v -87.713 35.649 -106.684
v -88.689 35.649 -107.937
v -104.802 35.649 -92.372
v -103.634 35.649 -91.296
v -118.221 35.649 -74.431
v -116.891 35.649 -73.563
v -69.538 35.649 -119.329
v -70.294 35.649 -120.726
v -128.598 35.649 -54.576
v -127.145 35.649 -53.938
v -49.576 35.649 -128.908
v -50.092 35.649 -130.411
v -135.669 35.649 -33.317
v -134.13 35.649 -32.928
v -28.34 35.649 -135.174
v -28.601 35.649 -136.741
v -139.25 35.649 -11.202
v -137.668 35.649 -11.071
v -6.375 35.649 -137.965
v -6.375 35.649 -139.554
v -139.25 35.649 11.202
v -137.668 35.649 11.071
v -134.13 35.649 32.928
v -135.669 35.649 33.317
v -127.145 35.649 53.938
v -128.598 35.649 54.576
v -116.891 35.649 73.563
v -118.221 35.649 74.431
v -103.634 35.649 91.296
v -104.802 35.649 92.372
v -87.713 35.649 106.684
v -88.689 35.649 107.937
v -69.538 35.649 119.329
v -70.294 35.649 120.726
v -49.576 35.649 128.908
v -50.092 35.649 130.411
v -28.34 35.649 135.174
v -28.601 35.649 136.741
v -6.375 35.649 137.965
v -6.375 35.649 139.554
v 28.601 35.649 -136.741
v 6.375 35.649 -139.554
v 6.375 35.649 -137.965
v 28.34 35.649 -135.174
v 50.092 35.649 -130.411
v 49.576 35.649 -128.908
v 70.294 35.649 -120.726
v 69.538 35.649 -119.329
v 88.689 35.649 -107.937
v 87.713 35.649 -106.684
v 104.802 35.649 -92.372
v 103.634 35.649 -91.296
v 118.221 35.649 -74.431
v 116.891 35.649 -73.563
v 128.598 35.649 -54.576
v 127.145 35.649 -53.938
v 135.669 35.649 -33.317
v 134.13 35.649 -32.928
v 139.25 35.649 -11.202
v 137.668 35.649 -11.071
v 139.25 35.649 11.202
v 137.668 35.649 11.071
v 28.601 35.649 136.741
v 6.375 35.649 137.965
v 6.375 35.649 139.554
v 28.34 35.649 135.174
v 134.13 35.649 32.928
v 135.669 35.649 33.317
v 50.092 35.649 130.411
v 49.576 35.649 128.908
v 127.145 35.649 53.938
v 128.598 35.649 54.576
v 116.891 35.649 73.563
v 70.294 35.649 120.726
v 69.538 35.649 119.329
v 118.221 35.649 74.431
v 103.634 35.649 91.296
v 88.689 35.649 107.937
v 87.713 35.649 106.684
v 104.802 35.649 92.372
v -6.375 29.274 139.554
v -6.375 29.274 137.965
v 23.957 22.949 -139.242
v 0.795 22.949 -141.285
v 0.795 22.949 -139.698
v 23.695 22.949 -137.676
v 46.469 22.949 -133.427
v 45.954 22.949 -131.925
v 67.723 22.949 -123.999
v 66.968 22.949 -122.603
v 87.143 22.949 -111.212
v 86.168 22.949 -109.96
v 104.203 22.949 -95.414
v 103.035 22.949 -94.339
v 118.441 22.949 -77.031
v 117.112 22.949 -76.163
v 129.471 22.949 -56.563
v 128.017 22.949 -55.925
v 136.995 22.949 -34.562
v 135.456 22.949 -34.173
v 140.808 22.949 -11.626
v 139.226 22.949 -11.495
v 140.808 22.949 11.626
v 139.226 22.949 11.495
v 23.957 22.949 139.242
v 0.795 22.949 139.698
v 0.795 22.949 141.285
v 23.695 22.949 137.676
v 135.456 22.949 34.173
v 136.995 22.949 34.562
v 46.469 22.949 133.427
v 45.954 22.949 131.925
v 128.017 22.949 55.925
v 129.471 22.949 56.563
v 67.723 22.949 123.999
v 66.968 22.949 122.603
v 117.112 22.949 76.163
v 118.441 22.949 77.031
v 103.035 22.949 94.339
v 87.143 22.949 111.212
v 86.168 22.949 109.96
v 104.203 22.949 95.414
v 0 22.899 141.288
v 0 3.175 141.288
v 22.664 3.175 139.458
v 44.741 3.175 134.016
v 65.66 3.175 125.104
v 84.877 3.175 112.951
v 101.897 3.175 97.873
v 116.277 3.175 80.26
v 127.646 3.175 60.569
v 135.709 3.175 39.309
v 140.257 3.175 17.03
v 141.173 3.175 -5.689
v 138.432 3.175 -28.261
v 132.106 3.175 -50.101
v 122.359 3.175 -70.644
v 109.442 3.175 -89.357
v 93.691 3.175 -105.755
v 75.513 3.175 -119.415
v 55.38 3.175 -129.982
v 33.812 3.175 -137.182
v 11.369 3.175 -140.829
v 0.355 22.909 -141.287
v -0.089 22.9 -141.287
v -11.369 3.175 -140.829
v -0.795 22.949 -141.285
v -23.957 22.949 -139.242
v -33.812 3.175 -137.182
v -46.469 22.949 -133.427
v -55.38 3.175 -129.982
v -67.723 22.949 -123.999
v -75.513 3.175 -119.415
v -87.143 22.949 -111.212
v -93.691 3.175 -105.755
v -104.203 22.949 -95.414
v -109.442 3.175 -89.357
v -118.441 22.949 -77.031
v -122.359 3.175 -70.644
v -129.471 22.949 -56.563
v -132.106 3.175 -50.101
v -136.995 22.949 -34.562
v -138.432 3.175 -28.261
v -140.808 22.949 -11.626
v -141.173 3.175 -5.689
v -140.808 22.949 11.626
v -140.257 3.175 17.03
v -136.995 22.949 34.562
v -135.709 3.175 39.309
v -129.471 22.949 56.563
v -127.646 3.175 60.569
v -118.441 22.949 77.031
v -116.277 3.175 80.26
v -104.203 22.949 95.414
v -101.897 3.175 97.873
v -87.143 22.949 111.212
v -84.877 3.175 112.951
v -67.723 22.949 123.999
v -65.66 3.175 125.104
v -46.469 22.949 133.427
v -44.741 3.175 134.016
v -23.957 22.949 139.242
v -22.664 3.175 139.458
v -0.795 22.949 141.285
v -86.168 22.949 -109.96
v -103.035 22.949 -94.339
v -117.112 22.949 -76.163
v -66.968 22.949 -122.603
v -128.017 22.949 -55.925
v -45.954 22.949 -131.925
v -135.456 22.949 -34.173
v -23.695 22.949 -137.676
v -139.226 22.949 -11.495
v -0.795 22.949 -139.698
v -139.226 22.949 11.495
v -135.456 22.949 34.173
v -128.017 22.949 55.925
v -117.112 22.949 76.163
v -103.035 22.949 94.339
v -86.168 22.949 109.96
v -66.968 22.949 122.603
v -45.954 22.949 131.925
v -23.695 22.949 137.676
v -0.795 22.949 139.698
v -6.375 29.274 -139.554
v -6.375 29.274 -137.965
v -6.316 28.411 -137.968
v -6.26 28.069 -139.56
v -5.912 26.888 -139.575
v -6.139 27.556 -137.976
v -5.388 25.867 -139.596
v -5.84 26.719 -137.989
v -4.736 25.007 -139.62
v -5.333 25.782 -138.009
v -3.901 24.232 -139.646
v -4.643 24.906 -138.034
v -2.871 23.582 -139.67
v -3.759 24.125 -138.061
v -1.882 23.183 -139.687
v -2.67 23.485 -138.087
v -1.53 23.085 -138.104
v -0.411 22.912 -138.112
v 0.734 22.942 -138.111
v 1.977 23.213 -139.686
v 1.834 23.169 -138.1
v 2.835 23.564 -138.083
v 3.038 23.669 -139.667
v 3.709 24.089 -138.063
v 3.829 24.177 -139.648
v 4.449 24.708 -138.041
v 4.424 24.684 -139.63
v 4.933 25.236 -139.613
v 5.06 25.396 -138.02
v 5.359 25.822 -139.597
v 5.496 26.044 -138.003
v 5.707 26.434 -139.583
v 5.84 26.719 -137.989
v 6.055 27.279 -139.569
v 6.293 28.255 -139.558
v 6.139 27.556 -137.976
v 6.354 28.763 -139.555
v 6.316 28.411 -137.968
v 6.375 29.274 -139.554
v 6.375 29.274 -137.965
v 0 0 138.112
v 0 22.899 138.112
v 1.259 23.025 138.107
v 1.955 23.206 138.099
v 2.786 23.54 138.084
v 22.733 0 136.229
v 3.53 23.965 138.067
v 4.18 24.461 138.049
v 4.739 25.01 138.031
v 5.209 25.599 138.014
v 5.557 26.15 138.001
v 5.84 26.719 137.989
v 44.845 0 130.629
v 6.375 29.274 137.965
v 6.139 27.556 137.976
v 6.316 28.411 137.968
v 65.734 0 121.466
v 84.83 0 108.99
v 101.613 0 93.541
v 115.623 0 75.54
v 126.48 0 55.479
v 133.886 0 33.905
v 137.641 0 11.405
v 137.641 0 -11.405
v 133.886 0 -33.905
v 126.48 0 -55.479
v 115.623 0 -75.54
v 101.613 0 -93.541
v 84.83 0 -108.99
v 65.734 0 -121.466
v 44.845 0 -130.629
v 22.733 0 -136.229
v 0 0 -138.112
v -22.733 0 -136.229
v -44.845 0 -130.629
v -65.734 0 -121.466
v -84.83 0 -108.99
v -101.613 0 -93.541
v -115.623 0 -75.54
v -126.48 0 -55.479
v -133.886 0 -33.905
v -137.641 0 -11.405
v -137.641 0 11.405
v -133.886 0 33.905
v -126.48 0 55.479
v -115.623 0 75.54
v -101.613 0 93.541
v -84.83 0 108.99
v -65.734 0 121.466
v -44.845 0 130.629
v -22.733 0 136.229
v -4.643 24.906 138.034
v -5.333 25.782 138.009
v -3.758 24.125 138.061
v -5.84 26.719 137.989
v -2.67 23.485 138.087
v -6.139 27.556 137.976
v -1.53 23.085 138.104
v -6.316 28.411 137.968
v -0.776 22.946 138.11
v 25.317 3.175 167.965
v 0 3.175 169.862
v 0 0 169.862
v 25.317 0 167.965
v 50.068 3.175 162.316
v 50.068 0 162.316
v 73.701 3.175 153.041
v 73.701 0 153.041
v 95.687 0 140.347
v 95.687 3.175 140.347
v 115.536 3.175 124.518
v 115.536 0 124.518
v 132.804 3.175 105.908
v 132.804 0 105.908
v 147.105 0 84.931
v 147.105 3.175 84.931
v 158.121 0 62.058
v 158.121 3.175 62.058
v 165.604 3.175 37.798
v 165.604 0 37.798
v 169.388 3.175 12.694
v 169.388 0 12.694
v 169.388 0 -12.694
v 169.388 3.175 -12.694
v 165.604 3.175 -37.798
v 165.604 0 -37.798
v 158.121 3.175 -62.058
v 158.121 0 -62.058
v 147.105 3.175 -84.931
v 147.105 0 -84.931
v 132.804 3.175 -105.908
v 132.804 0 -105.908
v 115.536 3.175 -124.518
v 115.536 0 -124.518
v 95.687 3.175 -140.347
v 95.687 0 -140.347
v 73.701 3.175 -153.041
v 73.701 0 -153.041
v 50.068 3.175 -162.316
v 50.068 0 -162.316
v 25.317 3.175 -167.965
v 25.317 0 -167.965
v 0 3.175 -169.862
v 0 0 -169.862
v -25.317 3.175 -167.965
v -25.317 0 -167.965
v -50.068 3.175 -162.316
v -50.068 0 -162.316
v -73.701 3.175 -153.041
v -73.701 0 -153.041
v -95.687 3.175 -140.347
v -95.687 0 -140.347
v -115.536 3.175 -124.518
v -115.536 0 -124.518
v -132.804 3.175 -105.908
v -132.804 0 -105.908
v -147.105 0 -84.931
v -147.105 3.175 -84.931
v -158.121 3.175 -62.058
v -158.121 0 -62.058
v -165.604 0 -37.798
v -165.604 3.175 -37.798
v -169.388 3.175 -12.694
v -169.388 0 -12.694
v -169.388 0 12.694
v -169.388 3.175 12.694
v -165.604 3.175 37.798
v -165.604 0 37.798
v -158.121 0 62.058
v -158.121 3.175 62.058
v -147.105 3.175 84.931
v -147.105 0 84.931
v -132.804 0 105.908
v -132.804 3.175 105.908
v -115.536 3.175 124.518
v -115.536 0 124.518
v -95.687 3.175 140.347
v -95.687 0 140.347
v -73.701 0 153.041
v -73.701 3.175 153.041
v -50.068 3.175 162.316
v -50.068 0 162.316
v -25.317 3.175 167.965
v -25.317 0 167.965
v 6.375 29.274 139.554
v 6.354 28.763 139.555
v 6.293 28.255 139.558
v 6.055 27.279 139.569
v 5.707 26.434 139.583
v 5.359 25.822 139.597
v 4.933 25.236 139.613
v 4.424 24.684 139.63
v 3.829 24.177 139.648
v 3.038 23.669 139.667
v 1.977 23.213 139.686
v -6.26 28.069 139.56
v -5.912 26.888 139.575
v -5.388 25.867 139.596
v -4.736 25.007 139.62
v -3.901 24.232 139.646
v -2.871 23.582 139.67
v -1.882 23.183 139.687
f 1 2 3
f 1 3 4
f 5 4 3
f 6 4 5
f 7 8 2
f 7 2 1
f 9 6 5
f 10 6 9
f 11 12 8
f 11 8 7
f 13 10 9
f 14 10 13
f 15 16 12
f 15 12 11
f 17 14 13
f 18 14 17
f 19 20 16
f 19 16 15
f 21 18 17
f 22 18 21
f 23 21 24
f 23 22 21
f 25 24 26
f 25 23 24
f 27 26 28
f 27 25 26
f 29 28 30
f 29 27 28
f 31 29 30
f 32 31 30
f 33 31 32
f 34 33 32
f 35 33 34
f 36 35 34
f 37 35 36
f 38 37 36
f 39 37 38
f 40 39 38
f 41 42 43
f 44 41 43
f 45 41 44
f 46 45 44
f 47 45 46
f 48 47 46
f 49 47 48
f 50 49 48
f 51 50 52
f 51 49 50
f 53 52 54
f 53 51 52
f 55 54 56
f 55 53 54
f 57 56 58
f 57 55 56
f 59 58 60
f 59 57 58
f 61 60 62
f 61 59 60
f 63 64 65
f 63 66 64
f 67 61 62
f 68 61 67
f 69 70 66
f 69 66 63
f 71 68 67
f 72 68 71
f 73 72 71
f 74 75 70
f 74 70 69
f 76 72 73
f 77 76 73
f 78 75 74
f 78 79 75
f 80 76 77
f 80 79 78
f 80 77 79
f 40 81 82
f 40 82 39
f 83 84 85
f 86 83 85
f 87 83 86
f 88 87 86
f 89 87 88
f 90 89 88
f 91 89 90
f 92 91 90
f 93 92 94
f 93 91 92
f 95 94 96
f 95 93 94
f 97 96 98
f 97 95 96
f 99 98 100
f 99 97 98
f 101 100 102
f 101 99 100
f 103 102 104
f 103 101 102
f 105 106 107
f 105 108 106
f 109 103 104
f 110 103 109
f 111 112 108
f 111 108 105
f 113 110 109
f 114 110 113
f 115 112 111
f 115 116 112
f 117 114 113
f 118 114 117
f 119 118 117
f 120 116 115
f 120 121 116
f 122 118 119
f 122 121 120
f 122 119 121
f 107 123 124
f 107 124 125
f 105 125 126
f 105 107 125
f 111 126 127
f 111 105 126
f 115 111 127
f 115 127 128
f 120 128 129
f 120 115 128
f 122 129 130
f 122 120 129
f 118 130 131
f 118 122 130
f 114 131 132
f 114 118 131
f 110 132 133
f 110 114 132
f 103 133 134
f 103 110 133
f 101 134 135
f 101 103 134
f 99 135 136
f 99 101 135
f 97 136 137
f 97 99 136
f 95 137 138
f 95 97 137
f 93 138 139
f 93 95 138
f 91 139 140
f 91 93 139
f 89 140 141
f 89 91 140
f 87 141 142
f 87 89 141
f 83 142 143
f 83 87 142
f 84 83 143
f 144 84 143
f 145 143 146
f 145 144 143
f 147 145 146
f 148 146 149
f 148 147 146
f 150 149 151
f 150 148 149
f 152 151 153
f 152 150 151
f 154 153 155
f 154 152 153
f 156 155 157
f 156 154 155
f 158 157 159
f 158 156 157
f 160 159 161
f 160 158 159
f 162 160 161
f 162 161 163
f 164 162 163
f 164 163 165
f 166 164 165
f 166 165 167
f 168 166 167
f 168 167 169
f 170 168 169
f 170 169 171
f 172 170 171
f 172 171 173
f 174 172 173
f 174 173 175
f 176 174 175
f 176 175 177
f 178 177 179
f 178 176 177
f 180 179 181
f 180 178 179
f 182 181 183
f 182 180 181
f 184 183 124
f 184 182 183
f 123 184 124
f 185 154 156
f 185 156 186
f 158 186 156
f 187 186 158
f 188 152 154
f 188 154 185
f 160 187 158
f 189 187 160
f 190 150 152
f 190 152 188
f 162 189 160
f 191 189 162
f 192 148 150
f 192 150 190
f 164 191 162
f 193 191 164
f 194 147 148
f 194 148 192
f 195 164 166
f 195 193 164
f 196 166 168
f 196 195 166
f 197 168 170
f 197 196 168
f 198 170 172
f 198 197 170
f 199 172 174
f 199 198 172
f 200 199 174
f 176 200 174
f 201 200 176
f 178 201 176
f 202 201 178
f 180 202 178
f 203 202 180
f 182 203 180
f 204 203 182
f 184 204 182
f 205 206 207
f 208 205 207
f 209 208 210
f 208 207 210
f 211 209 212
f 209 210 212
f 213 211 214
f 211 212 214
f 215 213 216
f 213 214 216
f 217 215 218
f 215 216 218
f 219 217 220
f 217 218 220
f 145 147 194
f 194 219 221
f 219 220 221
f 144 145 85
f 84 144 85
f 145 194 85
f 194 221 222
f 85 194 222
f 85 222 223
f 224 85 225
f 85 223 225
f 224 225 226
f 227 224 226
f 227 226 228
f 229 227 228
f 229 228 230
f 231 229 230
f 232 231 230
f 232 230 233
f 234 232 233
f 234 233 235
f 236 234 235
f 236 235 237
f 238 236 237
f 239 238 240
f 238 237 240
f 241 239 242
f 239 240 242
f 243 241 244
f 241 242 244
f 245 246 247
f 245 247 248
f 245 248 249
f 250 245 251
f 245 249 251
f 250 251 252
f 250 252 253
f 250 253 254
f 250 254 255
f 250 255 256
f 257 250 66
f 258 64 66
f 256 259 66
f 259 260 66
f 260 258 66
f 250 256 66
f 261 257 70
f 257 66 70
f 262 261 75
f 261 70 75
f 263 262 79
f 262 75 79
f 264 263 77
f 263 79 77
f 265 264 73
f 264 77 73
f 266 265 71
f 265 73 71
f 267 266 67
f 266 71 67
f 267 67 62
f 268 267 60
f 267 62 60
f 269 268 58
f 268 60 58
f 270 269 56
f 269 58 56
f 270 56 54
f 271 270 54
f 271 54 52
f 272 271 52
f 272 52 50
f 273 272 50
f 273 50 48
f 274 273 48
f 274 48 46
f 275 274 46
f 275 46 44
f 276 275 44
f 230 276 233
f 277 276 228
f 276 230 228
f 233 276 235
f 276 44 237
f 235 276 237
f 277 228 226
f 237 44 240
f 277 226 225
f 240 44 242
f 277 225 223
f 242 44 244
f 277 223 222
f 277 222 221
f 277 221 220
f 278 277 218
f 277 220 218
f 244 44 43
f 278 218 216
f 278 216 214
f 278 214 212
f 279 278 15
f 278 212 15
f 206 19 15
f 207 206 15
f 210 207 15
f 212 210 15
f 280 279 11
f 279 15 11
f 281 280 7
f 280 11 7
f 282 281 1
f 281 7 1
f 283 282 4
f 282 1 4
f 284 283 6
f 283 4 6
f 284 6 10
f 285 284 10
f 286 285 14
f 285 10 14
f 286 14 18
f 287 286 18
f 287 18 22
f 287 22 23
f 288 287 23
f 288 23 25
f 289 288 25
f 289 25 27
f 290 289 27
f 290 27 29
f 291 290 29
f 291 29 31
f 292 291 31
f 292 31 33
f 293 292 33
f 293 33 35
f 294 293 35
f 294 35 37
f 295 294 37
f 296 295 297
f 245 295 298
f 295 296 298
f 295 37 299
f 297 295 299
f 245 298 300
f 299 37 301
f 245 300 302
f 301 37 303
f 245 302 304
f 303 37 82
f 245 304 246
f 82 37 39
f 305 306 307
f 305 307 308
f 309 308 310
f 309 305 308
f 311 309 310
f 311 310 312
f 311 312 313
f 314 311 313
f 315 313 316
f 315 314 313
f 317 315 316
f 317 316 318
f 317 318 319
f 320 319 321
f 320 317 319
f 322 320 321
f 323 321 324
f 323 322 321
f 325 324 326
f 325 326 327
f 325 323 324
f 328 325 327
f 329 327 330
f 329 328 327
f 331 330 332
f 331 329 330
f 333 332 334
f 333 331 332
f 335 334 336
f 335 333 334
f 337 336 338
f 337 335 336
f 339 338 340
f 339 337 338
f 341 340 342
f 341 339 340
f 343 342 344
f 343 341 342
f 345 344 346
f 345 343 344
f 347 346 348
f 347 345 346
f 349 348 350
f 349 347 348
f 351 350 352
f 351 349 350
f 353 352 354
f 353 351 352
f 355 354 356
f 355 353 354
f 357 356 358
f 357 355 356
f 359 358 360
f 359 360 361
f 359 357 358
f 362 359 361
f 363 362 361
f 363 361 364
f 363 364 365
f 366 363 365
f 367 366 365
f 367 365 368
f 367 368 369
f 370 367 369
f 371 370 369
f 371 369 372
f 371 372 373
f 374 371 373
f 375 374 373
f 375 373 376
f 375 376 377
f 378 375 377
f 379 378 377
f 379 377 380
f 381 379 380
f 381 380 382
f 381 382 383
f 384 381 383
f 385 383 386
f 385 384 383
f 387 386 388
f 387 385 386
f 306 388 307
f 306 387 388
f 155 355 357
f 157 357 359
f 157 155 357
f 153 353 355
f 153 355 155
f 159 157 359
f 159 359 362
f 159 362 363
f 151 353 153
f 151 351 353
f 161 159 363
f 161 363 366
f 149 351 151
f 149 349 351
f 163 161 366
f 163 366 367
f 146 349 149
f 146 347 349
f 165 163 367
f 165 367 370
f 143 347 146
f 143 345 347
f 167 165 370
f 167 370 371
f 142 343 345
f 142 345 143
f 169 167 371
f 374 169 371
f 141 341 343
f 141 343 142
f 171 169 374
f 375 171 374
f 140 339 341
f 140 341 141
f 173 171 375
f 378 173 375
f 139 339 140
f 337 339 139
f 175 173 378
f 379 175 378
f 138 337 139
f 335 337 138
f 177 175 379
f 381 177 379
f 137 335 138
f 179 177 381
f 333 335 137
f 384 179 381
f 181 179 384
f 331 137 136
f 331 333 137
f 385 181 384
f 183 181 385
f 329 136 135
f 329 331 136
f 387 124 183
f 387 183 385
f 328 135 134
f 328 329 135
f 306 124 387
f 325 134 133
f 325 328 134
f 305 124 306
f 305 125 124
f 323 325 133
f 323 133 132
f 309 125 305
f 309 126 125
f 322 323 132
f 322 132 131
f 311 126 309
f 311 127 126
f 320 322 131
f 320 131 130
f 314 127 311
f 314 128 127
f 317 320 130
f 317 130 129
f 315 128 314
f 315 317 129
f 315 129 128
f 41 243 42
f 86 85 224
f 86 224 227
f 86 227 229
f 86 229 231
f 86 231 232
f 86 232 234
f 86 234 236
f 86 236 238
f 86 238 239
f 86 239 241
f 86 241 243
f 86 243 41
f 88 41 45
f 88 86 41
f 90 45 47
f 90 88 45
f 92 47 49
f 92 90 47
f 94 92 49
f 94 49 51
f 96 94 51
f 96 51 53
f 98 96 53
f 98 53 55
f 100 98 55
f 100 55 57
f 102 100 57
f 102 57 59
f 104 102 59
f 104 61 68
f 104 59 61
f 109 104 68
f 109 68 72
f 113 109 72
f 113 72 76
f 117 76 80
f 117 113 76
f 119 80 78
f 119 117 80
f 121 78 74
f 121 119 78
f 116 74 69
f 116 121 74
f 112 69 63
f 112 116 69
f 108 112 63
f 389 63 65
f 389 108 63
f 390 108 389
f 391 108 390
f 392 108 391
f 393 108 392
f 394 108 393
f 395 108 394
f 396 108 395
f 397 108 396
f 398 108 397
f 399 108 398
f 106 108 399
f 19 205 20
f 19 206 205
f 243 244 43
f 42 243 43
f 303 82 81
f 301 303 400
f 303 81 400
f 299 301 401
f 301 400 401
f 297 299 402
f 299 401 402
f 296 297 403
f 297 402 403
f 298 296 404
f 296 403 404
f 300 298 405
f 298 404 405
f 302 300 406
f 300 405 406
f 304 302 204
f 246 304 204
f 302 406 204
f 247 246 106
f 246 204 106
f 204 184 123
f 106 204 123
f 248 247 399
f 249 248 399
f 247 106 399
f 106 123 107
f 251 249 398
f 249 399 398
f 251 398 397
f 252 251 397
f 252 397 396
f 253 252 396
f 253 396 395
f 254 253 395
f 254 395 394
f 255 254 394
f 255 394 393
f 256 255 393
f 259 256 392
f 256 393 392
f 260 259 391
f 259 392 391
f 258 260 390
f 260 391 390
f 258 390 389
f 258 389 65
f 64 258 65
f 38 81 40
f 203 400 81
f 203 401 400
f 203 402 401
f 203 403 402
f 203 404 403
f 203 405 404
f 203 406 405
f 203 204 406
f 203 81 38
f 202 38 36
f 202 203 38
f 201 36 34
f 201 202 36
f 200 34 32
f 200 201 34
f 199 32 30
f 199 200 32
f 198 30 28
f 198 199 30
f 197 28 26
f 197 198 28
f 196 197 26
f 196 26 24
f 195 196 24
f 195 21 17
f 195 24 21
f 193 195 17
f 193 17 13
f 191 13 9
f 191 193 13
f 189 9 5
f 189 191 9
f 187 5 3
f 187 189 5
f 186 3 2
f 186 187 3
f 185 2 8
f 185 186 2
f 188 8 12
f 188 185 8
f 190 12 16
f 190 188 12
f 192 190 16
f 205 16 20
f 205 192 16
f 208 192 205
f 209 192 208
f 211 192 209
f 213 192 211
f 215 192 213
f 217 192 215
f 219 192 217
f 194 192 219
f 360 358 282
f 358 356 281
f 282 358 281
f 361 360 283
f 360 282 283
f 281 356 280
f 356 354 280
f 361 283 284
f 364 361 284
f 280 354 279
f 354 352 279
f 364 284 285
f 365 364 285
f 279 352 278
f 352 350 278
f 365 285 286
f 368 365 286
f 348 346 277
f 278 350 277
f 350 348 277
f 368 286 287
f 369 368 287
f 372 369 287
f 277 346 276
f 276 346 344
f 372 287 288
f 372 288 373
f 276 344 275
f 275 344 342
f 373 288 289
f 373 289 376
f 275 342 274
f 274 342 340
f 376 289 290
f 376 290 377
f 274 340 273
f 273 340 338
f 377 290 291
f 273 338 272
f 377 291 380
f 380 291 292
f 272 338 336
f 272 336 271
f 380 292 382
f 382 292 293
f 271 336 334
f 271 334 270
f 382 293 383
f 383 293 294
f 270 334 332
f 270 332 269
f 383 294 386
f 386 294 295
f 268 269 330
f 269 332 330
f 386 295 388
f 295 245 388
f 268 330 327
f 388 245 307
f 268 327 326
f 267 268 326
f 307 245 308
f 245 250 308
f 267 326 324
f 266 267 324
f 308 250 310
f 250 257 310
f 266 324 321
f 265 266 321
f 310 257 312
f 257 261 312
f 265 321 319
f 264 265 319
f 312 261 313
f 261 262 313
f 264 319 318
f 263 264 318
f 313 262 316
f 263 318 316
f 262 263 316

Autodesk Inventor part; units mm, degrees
ref_plane "YZ Plane" through (0, 0, 0) normal (1, 0, 0) x (0, 1, 0)
ref_plane "XZ Plane" through (0, 0, 0) normal (0, 1, 0) x (-1, 0, 0)
ref_plane "XY Plane" through (0, 0, 0) normal (0, 0, 1) x (1, 0, 0)
sketch "Sketch1" plane through (0, 0, 0) normal (1, 0, 0) x (0, 1, 0)
  line L0 (0, 0) -> (50.8, 0)
  line L1 (0, 138.1125) -> (26.719, 138.1125)
  line L2 (0, 138.1125) -> (0, 169.8625)
  line L3 (0, 169.8625) -> (3.175, 169.8625)
  line L4 (3.175, 169.8625) -> (3.175, 141.2875)
  line L5 (3.175, 141.2875) -> (22.9489, 141.2875)
  line L6 (60.325, 141.2875) -> (60.325, 179.3875)
  line L7 (60.325, 179.3875) -> (63.5, 179.3875)
  line L8 (63.5, 179.3875) -> (63.5, 138.1125)
  line L9 (35.6489, 138.1125) -> (26.719, 138.1125)
  line L10 (29.2989, 139.7) -> (22.9489, 139.7)
  line L11 (22.9489, 139.7) -> (22.9489, 141.2875)
  line L12 (29.2989, 139.7) -> (35.6489, 139.7)
  line L13 (35.6489, 139.7) -> (35.6489, 138.1125)
  line L14 (29.2989, 166.1379) -> (29.2989, 141.2875)
  line L15 (29.2989, 138.1125) -> (29.2989, 120.1049)
  point P0 (62.1333, 179.3875)
  point P1 (1.5875, 169.8625)
  dimension "d0" = 50.8
  dimension "d1" = 138.1125
  dimension "d2" = 31.75
  dimension "d3" = 3.175
  dimension "d4" = 3.175
  dimension "d5" = 57.15
  dimension "d6" = 38.1
  dimension "d7" = 3.175
  dimension "d13" = 26.1239
  dimension "d14" = 1.5875
  dimension "d15" = 6.35
  dimension "d16" = 6.35
revolve "Revolution1" add sketch "Sketch1" angle 360 about axis through (0, 0, 0) along (0, 1, 0)
ref_plane "Work Plane2" through (0, 1.5875, 169.8625) normal (0, 0, 1) x (1, 0, 0)
sketch "Sketch3" plane through (0, 1.5875, 169.8625) normal (0, 0, 1) x (1, 0, 0)
  arc A0 (-6.3749, 27.6865) -> (6.3749, 27.6865) centre (0, 27.6865) ccw
  line L0 (138.1125, 34.0614) -> (-138.1125, 34.0614) projected
  line L1 (-6.3749, 27.6865) -> (-6.3749, 34.0614)
  line L2 (6.3749, 27.6865) -> (6.3749, 34.0614)
  point P0 (0, -1.5875)
  point P1 (0, 17.4621)
extrude "Extrusion2" cut sketch "Sketch3" against normal through all
properties part number "Layer2_Bottom"
